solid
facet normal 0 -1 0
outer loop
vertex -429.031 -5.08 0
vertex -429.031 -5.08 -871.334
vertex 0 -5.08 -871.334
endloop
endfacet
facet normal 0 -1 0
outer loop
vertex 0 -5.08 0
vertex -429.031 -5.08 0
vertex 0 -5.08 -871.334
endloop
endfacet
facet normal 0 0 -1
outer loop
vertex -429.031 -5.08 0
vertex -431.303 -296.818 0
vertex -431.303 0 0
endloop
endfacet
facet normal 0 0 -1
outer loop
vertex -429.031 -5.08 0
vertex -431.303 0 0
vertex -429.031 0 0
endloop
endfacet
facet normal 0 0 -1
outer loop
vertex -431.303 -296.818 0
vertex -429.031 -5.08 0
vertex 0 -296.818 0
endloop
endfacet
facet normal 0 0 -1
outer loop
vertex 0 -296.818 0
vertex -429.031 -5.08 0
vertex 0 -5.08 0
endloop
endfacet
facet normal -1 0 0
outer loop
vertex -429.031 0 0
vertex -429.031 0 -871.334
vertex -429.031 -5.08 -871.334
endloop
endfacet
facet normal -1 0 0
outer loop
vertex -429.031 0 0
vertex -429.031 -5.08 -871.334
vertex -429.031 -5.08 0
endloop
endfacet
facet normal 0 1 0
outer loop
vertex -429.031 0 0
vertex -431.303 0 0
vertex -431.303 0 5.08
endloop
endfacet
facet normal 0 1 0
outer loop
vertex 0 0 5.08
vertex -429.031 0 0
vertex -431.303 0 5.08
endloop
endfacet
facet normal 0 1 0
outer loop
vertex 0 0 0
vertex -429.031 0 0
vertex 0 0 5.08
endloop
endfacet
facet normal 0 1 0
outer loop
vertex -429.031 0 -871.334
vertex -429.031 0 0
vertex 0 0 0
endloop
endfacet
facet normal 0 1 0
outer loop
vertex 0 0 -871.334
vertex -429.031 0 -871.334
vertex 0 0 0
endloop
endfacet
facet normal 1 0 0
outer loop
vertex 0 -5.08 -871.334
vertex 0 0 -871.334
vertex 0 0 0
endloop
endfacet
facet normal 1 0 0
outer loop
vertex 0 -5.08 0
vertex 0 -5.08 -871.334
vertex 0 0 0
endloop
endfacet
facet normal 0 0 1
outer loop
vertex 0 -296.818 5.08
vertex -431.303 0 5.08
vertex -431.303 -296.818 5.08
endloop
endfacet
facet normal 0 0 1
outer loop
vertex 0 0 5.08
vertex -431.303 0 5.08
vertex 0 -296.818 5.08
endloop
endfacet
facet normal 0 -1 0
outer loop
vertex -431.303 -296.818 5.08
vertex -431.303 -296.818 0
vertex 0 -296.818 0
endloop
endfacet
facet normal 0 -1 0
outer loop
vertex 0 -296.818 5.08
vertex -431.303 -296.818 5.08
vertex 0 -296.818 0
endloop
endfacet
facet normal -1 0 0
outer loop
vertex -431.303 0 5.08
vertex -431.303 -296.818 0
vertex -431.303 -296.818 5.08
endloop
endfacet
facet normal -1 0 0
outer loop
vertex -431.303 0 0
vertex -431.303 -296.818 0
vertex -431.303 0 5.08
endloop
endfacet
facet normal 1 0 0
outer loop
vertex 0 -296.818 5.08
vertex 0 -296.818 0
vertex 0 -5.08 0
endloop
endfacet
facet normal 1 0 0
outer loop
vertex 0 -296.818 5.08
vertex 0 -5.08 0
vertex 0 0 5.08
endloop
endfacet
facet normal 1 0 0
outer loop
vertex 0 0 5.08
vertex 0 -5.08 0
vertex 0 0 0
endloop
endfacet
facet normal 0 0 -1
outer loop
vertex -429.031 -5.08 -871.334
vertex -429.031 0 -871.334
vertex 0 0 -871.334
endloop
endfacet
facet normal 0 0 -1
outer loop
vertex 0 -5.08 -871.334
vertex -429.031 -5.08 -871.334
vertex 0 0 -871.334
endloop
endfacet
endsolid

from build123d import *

# Parameters (mm, degrees)
F0_W     = 429.031141
F0_H     = 871.334374
F1_DEPTH = 5.08
F2_W     = 431.302786
F2_H     = 296.81766
F3_DEPTH = 5.08


with BuildPart() as f1:
    # F0 (on Front) → F1 (new body)
    with BuildSketch(Plane.XZ):
        with Locations((-214.51557, -435.667187)):
            Rectangle(F0_W, F0_H)
    extrude(amount=F1_DEPTH)

    # F2 (on Top) → F3 (join)
    with BuildSketch(Plane.XY):
        with Locations((-215.651393, -148.40883)):
            Rectangle(F2_W, F2_H)
    extrude(amount=F3_DEPTH)


solid = f1.part
